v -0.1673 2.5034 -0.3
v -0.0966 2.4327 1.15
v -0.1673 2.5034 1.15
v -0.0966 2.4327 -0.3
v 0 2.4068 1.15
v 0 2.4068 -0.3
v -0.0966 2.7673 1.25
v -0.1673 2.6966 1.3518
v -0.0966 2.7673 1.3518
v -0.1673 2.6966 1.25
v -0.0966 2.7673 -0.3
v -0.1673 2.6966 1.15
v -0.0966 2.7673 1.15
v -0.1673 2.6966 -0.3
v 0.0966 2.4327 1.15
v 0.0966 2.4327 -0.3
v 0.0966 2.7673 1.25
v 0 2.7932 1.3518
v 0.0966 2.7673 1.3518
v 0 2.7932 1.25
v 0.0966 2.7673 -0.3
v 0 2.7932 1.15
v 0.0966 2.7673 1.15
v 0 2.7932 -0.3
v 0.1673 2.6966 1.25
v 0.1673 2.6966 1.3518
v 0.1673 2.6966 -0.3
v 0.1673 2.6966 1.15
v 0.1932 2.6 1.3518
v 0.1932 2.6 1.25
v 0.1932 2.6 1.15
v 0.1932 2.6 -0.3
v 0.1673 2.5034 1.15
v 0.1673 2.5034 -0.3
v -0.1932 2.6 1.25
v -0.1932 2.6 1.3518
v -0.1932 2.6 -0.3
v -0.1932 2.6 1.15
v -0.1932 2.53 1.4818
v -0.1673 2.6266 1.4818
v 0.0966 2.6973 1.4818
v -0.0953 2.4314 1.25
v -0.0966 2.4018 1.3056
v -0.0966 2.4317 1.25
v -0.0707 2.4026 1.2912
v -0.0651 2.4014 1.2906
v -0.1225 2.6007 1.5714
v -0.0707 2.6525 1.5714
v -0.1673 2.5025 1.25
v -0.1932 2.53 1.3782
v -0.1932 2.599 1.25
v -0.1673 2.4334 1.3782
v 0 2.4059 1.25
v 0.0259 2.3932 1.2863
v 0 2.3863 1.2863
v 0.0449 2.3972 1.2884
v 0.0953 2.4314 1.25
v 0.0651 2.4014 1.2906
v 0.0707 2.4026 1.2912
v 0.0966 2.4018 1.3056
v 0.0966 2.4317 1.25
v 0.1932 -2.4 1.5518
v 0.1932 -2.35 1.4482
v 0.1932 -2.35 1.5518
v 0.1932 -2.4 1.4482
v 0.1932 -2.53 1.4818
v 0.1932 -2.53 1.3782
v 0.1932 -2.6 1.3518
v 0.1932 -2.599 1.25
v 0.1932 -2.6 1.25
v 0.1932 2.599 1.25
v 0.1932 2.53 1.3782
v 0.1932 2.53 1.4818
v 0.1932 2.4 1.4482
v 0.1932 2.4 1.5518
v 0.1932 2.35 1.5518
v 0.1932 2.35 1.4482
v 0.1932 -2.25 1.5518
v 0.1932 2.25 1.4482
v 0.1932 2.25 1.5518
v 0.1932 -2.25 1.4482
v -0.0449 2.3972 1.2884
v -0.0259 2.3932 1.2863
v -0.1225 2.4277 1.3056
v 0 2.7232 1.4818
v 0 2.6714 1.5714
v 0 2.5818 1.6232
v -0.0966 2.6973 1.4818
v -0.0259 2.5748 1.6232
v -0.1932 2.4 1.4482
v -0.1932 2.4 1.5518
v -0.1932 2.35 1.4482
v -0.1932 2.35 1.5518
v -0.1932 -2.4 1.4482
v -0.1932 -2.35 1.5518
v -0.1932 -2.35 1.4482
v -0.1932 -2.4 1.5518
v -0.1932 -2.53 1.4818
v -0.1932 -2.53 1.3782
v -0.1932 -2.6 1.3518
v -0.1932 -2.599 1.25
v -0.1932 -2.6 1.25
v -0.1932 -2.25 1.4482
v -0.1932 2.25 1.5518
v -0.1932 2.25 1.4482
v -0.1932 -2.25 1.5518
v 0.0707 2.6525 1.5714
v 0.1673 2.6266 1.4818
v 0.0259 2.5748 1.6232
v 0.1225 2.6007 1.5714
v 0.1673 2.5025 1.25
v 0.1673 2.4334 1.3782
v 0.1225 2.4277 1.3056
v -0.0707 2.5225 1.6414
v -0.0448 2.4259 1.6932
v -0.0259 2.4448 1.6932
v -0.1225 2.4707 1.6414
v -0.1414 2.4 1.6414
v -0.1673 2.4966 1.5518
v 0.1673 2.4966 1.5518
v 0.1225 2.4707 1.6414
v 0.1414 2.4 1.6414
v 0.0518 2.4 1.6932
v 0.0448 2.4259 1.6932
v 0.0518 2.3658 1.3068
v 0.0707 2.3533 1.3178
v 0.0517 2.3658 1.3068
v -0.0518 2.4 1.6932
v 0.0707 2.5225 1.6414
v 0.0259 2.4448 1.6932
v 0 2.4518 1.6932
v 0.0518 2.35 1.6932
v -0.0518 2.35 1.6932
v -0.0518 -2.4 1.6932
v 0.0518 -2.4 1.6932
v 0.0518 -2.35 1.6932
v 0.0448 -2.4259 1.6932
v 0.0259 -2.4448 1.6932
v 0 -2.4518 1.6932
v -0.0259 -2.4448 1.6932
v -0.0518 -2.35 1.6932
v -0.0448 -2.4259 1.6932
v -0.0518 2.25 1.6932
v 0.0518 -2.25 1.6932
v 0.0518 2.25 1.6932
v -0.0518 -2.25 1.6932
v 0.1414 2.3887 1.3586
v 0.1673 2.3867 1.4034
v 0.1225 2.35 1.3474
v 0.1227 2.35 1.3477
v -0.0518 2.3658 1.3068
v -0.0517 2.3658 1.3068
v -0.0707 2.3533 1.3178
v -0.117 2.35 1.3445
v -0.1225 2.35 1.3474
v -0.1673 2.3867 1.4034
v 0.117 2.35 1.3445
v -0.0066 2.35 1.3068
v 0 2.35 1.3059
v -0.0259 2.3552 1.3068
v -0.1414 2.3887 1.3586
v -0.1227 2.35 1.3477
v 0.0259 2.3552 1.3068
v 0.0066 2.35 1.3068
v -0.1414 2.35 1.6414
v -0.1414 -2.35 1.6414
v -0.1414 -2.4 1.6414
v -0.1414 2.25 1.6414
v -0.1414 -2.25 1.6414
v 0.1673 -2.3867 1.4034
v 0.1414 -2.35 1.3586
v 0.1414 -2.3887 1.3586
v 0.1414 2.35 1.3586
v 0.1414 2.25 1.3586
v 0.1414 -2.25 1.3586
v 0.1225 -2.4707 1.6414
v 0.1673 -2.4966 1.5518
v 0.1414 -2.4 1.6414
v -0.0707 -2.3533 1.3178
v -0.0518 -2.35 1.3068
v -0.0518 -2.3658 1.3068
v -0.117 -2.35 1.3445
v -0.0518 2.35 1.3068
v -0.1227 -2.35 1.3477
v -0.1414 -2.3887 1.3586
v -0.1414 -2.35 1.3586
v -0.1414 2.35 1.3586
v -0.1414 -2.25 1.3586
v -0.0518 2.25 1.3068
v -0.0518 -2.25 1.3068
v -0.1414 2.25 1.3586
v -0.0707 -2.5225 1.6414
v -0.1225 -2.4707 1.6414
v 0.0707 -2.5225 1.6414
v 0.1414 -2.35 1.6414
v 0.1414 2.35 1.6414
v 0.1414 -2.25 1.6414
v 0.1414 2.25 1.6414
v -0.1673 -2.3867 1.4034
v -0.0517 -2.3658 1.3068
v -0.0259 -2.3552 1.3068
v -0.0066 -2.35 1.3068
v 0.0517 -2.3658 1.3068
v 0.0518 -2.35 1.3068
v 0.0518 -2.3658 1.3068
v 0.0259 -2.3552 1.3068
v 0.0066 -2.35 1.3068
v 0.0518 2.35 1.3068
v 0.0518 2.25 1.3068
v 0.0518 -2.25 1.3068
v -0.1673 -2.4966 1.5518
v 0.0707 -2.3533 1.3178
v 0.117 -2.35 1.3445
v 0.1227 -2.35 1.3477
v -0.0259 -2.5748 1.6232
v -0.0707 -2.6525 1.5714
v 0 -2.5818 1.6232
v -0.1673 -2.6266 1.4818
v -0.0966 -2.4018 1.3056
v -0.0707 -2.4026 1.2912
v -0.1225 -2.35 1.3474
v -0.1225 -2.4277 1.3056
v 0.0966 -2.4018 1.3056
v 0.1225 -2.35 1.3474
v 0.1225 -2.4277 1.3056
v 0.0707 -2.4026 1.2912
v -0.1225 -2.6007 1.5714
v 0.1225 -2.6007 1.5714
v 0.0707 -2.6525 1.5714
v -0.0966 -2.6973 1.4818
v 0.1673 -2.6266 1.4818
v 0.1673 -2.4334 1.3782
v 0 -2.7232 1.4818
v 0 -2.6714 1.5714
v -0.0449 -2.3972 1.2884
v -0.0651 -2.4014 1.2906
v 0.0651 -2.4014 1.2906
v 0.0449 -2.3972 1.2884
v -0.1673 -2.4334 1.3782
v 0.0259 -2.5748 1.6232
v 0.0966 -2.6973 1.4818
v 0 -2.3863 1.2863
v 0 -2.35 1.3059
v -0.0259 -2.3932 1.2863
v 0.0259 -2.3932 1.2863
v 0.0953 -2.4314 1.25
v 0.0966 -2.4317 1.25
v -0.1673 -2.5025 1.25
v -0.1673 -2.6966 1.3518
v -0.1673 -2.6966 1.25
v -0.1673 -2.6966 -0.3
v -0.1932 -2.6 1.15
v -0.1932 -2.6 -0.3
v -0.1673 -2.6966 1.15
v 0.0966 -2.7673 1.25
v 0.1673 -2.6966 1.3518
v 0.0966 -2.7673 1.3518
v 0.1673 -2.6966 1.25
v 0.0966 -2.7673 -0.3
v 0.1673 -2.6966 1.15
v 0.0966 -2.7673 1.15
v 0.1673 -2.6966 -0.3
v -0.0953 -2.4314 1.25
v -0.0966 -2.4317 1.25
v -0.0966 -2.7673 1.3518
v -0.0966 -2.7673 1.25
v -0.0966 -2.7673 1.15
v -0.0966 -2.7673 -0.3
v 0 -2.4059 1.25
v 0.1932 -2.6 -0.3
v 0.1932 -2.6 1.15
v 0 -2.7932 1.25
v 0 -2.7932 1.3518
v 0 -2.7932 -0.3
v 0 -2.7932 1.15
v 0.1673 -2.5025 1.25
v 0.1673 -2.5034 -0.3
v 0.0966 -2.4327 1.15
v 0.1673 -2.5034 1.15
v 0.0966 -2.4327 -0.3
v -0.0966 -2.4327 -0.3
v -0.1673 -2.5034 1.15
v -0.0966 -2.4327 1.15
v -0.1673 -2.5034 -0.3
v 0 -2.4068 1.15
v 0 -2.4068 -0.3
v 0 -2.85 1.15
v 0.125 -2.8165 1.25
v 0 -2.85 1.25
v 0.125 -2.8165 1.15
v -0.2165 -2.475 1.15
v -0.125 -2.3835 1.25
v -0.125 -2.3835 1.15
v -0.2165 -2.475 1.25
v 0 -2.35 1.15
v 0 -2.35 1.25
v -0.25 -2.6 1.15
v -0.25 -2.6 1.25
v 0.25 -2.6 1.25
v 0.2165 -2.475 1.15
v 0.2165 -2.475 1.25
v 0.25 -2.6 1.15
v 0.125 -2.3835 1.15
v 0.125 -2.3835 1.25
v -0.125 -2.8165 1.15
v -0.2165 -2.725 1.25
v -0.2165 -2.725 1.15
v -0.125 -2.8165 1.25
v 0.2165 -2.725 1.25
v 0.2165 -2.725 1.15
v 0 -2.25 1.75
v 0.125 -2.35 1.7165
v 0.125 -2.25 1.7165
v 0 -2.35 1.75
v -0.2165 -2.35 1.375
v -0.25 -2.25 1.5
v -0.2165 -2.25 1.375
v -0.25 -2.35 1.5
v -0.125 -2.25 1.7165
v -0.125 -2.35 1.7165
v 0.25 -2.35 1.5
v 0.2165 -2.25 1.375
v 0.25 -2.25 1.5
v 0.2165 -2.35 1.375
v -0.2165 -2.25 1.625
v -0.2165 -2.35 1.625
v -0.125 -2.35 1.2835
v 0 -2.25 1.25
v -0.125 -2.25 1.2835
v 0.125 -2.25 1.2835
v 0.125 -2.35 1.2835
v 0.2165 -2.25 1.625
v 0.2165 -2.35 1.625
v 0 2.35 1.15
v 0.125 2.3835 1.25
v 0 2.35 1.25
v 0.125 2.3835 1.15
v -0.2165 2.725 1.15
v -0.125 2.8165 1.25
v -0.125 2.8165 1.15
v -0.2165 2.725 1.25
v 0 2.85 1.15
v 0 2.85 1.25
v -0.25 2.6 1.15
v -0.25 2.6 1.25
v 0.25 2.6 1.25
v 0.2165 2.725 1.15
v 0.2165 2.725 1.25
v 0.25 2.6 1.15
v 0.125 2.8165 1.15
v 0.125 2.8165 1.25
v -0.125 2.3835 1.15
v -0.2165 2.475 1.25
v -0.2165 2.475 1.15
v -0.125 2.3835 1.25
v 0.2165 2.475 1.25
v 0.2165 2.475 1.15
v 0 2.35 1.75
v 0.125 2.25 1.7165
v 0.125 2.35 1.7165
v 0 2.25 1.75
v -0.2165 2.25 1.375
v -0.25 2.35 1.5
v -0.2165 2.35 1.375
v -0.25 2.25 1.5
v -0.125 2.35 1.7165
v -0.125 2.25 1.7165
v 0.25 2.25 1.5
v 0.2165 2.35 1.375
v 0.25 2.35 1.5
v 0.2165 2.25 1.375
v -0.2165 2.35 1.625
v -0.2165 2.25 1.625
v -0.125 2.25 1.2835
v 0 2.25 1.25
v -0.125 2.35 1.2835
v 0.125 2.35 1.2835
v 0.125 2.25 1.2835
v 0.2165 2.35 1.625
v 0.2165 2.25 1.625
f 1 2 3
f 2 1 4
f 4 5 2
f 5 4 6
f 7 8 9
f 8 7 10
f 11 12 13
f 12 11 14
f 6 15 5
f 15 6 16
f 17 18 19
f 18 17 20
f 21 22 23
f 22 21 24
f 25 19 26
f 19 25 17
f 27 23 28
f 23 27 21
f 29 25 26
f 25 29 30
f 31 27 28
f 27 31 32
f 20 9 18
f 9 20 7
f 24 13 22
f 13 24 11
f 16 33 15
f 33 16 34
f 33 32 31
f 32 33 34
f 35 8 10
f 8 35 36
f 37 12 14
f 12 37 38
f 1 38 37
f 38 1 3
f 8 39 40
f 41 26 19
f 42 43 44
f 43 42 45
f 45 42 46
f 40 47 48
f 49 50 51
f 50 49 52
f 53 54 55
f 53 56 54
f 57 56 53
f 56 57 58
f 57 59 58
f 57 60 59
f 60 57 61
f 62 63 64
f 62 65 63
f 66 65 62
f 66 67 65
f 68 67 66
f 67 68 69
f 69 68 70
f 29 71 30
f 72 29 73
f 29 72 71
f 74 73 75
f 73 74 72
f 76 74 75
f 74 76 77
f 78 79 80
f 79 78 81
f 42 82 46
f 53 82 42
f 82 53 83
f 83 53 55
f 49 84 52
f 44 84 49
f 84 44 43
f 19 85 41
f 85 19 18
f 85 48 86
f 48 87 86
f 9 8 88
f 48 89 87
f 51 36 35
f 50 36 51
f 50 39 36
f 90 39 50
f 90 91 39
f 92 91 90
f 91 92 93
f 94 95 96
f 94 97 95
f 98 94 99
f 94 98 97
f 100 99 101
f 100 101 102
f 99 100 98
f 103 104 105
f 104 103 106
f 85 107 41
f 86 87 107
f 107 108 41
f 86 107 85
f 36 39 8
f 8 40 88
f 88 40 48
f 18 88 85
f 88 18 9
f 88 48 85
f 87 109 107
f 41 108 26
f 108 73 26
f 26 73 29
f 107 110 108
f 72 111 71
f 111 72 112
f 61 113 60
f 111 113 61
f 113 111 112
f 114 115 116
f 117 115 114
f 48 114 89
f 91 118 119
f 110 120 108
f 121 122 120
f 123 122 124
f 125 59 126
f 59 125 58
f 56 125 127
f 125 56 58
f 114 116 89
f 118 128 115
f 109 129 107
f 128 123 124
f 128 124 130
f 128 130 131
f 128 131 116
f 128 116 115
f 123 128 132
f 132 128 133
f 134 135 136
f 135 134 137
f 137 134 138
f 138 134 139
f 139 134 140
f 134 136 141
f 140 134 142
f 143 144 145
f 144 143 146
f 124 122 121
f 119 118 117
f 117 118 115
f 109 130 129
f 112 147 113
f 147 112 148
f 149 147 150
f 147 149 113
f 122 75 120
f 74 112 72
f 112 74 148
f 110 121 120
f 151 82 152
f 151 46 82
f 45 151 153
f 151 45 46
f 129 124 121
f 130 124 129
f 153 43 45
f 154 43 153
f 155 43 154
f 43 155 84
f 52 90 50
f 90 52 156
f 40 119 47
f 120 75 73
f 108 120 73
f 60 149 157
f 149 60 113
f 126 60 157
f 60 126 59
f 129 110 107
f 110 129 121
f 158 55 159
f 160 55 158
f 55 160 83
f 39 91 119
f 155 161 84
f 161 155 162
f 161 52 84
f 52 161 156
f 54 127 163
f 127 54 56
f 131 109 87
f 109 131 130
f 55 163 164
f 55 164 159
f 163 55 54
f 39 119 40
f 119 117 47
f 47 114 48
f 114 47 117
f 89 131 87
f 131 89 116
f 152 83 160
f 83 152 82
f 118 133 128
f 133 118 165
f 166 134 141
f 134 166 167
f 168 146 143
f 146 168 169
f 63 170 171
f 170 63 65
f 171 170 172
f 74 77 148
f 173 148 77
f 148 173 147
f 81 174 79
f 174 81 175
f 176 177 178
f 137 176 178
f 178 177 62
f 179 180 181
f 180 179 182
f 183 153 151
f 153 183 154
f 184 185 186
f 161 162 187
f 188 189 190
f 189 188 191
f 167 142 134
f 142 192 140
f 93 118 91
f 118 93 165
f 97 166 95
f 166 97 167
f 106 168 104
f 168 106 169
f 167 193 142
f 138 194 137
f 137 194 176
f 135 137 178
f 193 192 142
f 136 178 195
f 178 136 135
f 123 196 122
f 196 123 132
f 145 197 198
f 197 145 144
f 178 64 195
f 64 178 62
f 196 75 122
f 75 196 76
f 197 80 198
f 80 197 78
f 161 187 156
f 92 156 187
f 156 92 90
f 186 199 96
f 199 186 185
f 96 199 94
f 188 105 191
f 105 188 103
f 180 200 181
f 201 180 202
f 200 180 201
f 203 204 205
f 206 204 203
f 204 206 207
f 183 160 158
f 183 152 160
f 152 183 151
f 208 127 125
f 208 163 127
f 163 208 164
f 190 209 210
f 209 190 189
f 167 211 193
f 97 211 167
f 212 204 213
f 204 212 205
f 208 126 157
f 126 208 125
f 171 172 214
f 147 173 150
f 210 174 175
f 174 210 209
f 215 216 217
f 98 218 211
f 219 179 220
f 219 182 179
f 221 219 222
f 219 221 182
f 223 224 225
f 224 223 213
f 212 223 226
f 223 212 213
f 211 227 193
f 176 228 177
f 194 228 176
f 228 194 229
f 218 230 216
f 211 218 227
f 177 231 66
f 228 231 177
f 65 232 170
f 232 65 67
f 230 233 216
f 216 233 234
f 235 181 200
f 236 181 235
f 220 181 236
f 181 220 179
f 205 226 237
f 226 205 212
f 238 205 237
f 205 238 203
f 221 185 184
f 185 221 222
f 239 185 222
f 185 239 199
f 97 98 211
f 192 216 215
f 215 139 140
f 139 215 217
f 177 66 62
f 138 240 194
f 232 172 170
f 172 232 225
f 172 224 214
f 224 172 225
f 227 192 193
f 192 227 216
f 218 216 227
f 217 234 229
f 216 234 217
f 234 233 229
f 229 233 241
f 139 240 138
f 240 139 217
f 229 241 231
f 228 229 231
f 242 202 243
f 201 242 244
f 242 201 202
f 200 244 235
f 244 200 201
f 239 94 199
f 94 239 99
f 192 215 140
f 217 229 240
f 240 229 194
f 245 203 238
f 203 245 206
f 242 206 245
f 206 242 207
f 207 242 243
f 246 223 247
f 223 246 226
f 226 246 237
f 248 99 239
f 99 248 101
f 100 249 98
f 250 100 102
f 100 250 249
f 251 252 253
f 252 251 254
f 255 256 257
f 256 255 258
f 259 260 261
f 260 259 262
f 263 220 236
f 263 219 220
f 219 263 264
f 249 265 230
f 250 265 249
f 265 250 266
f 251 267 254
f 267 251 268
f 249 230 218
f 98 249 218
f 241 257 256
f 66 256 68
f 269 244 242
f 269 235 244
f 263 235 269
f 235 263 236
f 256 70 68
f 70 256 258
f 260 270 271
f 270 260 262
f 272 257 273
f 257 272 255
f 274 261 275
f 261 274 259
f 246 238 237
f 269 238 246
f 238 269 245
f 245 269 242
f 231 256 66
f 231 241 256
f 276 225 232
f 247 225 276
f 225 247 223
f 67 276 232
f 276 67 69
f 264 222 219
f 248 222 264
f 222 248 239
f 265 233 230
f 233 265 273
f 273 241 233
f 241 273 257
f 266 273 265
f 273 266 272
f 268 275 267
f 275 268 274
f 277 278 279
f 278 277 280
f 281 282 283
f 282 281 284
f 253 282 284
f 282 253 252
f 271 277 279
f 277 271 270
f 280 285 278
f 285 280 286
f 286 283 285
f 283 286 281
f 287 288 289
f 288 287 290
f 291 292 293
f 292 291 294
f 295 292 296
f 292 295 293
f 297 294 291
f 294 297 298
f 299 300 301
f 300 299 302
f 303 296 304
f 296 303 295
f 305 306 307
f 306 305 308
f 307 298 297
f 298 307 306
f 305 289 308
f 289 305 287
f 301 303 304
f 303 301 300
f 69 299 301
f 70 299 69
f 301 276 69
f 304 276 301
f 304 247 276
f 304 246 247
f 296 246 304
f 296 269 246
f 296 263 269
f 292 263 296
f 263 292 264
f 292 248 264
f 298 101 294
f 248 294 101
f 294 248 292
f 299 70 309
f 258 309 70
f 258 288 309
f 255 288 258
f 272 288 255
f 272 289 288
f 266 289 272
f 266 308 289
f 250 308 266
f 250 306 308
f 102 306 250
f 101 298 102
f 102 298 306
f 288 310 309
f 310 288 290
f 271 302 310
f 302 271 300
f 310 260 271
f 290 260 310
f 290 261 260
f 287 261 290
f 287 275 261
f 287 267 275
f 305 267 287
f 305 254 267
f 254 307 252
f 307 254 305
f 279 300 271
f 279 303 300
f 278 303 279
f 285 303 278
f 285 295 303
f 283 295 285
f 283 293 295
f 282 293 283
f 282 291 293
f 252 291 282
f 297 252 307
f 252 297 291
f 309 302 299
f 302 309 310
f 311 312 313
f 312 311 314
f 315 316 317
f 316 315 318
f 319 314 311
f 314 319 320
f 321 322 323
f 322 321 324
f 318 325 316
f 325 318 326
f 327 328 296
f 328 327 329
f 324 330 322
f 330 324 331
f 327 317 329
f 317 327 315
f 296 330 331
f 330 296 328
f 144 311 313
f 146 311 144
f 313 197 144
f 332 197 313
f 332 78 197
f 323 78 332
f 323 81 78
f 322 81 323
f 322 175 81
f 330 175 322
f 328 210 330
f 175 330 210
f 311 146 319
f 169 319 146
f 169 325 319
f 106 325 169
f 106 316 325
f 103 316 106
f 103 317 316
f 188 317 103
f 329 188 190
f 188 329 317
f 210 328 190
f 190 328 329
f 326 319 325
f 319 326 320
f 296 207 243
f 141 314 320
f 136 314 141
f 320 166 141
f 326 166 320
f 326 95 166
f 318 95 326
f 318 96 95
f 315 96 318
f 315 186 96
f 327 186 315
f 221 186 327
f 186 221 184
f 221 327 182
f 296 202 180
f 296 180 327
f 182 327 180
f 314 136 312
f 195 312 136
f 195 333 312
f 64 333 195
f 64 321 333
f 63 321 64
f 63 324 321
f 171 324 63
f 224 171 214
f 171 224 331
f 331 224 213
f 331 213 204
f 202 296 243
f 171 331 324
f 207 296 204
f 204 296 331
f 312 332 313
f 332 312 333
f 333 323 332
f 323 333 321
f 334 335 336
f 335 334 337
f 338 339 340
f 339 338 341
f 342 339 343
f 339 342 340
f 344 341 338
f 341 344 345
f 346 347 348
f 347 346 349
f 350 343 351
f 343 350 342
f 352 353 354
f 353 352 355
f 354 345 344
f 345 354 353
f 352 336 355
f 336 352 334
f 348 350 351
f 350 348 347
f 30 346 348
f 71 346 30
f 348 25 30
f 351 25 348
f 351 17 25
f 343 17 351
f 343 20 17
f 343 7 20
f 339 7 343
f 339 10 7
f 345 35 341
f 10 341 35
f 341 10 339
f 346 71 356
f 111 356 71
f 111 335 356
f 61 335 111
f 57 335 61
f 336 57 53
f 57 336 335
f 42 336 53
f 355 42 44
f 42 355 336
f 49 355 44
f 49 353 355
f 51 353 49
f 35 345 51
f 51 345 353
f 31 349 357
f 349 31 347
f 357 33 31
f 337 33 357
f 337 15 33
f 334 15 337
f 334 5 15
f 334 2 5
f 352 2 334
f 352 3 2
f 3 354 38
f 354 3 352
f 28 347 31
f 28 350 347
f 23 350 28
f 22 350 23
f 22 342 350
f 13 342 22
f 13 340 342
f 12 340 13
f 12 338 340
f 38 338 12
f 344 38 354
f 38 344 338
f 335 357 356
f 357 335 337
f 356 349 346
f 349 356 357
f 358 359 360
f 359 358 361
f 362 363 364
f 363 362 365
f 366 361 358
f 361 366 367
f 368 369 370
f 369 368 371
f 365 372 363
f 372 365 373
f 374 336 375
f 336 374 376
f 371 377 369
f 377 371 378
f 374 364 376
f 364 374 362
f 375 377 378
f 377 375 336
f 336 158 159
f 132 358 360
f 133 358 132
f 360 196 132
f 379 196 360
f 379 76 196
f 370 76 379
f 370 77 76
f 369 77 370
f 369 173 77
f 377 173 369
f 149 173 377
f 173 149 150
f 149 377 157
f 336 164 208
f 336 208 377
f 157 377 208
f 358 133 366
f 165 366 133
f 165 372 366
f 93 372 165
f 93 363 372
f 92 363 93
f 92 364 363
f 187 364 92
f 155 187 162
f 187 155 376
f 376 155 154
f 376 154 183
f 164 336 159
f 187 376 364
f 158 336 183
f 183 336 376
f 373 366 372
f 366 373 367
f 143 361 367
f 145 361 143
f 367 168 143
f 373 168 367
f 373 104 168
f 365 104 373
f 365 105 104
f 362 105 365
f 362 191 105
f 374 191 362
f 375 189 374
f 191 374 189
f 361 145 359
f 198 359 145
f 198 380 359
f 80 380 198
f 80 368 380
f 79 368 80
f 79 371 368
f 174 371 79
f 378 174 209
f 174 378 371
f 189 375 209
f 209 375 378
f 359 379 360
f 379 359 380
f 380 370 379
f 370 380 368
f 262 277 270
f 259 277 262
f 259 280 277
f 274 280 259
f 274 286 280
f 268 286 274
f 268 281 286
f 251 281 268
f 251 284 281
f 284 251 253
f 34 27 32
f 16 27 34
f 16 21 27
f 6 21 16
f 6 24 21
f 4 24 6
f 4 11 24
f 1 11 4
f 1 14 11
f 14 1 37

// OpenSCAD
use <lib.scad>

hd = 64;
ld = 16;


module flangeHD() {
	cyl(0.25,0.25,0.1);
}

module epipe() {
	points = [
		[2.6,0,-1],
		[2.6,0,1.3],
		[2.53,0,1.43],
		[2.4,0,1.5],
		[-2.4,0,1.5],
		[-2.53,0,1.43],
		[-2.6,0,1.3],
		[-2.6,0,-1],
	];
	rotate([0,0,90]) difference() {
		union() {
			pipe(points, 0.2);
			translate([-2.6,0,1.2]) flangeHD();
			translate([-2.3,0,1.5]) rotate([0,90,0]) flangeHD();
			translate([2.6,0,1.2]) flangeHD();
			translate([2.3,0,1.5]) rotate([0,90,0]) flangeHD();
		}
		translate([0,0,-0.8]) box([6,6,1]);
	}
}

module pipeHD($fn=32) {
	epipe();
}

module pipeLD($fn=12) {
	epipe();
}

module glassHD() {
	translate([0,0,0.4]) box([4.3,0.3,1.4]);
}

module frameLD() {
	translate([0,0,0.4]) difference() {
		box([4.5,0.25,1.6]);
		box([4.3,0.3,1.4]);
	}
}

module frameHD() {
	minkowskiOutsideRound(0.01,$fn=8)
	frameLD();
}

module baseLD($fn=ld) {
	 difference() {
		hull() {
			translate([0,0,-1]) box([5.95, 5.95, 1]);
			translate([0,0,0]) box([5, 5, 0.1]);
		}
		translate([0,0,0.1]) box([4.75, 4.75, 1]);
	}
}

module baseHD($fn=hd) {
	minkowskiOutsideRound(0.01,$fn=8)
	baseLD();
}

module baseVLD($fn=ld) {
	union() {
		hull() baseLD();
		hull() for (i = [-2:1:2])
			translate([0,-i,0]) frameHD();
	}
}

module entity() {
	baseHD();
	for (i = [-2:1:2])
		translate([0,-i,0]) frameHD();
	for (i = [-2:1:2])
		translate([0,-i,0]) glassHD();
	translate([-1,0,0]) pipeHD();
	translate([1,0,0]) pipeHD();
}

//entity();

//baseHD();
//baseLD();
//baseVLD();

//frameHD();
//frameLD();

//pipeHD();
pipeLD();

//glassHD();

//%box([5.95,5.95,3]);
